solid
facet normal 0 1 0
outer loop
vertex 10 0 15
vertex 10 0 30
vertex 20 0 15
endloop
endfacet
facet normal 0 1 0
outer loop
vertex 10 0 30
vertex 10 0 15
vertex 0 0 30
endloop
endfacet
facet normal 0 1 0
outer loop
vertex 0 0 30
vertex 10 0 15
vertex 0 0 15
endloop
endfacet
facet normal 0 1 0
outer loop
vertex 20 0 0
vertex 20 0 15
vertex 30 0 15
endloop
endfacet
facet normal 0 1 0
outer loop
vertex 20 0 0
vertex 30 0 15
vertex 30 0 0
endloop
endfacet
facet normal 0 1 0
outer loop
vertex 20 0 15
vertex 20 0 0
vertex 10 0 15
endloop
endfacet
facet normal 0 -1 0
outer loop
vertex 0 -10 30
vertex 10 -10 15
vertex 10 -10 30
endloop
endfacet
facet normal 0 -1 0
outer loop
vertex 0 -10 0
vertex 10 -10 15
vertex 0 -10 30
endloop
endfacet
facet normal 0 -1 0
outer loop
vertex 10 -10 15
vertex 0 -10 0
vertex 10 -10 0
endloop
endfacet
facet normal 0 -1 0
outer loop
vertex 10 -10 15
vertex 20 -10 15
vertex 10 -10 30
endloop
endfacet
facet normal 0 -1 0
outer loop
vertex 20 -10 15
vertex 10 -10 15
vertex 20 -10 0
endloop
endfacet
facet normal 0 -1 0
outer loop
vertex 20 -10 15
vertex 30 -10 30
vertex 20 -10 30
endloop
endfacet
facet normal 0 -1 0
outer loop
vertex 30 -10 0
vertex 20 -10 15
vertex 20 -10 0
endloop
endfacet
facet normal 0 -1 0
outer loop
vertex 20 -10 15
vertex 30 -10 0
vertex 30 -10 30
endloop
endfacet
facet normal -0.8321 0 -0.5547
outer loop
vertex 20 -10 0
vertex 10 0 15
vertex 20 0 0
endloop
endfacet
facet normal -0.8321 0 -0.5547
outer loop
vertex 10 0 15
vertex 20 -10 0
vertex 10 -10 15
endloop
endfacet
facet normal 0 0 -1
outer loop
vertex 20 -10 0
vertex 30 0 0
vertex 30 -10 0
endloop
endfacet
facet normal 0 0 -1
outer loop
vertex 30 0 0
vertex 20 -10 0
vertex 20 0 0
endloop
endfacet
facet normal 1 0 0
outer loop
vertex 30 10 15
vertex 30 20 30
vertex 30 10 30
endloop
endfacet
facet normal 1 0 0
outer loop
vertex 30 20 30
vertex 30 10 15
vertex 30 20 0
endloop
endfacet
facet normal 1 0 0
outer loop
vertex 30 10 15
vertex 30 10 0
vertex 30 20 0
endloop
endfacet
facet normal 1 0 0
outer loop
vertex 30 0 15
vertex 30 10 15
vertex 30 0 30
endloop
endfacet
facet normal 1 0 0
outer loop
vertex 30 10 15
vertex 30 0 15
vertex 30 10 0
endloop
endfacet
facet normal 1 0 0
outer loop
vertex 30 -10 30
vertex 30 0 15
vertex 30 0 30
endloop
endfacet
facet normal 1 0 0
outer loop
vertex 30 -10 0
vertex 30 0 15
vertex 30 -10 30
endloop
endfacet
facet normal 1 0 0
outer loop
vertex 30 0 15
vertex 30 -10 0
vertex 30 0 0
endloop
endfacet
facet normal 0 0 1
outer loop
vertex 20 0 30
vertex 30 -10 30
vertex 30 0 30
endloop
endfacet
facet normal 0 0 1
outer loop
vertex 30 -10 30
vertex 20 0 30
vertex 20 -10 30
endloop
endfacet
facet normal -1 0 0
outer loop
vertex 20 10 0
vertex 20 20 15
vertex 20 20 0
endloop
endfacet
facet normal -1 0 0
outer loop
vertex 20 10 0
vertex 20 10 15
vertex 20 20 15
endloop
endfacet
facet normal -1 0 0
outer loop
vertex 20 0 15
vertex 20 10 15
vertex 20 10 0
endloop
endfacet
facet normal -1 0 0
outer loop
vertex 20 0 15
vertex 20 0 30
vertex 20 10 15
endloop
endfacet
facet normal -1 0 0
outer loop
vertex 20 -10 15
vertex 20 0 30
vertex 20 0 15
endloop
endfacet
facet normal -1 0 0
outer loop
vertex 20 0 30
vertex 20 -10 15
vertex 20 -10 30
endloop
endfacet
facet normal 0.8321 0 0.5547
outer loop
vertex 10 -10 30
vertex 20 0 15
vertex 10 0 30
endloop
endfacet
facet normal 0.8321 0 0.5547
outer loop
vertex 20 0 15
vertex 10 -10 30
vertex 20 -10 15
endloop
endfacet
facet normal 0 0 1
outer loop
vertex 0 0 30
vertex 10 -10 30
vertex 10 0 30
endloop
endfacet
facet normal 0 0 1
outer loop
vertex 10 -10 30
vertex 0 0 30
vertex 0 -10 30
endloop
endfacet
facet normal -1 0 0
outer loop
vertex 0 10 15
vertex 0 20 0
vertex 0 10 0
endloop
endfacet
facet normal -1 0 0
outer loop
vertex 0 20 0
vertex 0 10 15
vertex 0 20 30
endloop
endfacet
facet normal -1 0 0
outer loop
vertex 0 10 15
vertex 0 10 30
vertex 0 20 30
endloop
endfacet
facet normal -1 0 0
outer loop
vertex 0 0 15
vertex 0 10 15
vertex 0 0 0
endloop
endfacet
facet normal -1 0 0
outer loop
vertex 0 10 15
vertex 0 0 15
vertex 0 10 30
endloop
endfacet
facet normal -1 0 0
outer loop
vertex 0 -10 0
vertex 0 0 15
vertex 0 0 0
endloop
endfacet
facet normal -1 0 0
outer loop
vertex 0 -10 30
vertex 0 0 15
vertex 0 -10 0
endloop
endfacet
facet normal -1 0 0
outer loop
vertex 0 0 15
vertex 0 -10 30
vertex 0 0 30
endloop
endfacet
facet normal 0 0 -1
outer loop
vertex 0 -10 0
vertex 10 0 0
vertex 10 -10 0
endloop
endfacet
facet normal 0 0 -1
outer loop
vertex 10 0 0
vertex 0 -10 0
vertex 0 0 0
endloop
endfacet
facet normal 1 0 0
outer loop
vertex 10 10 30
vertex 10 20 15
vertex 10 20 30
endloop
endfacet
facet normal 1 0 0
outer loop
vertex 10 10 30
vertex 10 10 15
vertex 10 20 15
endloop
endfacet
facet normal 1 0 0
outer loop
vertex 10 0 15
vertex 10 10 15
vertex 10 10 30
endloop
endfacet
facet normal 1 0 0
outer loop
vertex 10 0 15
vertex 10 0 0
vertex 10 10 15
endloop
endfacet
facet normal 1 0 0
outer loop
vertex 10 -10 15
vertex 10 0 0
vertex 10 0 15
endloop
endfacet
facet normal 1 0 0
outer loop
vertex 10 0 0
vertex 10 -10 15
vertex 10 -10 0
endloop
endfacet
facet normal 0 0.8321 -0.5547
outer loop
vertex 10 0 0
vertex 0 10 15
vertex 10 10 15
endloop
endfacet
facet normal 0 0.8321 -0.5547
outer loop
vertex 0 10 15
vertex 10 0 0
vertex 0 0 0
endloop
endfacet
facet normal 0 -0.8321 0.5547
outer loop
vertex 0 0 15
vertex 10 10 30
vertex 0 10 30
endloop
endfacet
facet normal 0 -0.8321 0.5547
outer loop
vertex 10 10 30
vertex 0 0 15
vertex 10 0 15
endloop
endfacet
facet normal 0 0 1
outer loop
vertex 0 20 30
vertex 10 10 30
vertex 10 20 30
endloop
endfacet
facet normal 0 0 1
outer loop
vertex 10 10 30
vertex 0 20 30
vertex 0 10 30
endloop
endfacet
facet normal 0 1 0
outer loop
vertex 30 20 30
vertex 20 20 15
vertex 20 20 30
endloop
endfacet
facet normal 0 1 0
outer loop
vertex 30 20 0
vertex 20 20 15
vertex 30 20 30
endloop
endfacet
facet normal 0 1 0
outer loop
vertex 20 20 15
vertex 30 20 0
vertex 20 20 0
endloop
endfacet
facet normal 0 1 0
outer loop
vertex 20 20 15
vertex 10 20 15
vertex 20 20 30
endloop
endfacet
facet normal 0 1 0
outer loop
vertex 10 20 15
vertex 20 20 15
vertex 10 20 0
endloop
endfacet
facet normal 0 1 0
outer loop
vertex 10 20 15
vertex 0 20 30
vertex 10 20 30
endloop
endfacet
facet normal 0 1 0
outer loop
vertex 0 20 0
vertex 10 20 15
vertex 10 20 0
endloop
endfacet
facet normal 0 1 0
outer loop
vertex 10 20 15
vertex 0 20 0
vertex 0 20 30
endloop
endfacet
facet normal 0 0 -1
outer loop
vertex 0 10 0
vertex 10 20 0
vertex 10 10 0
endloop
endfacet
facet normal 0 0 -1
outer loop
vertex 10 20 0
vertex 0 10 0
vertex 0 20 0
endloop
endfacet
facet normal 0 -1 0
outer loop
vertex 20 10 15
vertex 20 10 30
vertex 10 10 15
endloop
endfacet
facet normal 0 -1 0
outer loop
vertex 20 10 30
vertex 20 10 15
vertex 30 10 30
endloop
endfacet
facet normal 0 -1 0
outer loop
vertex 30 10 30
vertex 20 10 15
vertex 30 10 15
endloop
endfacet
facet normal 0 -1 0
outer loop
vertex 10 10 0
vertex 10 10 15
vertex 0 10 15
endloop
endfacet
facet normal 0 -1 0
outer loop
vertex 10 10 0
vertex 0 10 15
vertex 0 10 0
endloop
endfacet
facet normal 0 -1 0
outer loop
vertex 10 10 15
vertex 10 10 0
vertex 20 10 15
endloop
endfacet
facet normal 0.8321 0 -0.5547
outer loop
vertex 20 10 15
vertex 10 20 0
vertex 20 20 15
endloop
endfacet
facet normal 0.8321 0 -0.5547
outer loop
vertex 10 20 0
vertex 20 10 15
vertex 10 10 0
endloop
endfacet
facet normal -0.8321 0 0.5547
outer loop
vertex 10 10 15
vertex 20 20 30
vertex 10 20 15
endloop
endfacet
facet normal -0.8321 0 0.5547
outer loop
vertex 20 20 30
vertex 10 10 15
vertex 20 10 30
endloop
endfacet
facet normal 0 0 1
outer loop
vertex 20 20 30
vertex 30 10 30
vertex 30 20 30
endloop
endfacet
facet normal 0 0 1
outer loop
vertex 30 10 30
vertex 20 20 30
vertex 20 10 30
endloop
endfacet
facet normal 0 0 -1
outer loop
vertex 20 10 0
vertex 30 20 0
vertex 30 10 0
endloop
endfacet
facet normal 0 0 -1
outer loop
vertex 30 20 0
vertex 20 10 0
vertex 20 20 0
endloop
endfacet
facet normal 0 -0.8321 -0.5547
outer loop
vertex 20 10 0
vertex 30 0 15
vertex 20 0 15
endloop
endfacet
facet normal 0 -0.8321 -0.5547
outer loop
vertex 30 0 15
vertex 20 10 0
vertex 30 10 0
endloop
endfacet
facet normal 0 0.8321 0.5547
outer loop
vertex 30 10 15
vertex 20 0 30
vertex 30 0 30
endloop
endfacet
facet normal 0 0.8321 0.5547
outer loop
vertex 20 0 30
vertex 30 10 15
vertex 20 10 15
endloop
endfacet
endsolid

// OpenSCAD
module n_2d() {
    polygon([
        [0, 0],
        [0, 30],
        [10, 30],
        [20, 15],
        [20, 30],
        [30, 30],
        [30, 0],
        [20, 0],
        [10, 15],
        [10, 0]
    ]);
}


module n_3d() {
    linear_extrude(height=10) {
        n_2d();
    }
}


union() {
    rotate([90, 0, 0]) n_3d();
    
    translate([10, 20, 0]) rotate([90, 0, -90]) n_3d();
    
    translate([30, 10, 0]) rotate([90, 0, 180]) n_3d();
    
    translate([20, -10, 0]) rotate([90, 0, 90]) n_3d();
}
